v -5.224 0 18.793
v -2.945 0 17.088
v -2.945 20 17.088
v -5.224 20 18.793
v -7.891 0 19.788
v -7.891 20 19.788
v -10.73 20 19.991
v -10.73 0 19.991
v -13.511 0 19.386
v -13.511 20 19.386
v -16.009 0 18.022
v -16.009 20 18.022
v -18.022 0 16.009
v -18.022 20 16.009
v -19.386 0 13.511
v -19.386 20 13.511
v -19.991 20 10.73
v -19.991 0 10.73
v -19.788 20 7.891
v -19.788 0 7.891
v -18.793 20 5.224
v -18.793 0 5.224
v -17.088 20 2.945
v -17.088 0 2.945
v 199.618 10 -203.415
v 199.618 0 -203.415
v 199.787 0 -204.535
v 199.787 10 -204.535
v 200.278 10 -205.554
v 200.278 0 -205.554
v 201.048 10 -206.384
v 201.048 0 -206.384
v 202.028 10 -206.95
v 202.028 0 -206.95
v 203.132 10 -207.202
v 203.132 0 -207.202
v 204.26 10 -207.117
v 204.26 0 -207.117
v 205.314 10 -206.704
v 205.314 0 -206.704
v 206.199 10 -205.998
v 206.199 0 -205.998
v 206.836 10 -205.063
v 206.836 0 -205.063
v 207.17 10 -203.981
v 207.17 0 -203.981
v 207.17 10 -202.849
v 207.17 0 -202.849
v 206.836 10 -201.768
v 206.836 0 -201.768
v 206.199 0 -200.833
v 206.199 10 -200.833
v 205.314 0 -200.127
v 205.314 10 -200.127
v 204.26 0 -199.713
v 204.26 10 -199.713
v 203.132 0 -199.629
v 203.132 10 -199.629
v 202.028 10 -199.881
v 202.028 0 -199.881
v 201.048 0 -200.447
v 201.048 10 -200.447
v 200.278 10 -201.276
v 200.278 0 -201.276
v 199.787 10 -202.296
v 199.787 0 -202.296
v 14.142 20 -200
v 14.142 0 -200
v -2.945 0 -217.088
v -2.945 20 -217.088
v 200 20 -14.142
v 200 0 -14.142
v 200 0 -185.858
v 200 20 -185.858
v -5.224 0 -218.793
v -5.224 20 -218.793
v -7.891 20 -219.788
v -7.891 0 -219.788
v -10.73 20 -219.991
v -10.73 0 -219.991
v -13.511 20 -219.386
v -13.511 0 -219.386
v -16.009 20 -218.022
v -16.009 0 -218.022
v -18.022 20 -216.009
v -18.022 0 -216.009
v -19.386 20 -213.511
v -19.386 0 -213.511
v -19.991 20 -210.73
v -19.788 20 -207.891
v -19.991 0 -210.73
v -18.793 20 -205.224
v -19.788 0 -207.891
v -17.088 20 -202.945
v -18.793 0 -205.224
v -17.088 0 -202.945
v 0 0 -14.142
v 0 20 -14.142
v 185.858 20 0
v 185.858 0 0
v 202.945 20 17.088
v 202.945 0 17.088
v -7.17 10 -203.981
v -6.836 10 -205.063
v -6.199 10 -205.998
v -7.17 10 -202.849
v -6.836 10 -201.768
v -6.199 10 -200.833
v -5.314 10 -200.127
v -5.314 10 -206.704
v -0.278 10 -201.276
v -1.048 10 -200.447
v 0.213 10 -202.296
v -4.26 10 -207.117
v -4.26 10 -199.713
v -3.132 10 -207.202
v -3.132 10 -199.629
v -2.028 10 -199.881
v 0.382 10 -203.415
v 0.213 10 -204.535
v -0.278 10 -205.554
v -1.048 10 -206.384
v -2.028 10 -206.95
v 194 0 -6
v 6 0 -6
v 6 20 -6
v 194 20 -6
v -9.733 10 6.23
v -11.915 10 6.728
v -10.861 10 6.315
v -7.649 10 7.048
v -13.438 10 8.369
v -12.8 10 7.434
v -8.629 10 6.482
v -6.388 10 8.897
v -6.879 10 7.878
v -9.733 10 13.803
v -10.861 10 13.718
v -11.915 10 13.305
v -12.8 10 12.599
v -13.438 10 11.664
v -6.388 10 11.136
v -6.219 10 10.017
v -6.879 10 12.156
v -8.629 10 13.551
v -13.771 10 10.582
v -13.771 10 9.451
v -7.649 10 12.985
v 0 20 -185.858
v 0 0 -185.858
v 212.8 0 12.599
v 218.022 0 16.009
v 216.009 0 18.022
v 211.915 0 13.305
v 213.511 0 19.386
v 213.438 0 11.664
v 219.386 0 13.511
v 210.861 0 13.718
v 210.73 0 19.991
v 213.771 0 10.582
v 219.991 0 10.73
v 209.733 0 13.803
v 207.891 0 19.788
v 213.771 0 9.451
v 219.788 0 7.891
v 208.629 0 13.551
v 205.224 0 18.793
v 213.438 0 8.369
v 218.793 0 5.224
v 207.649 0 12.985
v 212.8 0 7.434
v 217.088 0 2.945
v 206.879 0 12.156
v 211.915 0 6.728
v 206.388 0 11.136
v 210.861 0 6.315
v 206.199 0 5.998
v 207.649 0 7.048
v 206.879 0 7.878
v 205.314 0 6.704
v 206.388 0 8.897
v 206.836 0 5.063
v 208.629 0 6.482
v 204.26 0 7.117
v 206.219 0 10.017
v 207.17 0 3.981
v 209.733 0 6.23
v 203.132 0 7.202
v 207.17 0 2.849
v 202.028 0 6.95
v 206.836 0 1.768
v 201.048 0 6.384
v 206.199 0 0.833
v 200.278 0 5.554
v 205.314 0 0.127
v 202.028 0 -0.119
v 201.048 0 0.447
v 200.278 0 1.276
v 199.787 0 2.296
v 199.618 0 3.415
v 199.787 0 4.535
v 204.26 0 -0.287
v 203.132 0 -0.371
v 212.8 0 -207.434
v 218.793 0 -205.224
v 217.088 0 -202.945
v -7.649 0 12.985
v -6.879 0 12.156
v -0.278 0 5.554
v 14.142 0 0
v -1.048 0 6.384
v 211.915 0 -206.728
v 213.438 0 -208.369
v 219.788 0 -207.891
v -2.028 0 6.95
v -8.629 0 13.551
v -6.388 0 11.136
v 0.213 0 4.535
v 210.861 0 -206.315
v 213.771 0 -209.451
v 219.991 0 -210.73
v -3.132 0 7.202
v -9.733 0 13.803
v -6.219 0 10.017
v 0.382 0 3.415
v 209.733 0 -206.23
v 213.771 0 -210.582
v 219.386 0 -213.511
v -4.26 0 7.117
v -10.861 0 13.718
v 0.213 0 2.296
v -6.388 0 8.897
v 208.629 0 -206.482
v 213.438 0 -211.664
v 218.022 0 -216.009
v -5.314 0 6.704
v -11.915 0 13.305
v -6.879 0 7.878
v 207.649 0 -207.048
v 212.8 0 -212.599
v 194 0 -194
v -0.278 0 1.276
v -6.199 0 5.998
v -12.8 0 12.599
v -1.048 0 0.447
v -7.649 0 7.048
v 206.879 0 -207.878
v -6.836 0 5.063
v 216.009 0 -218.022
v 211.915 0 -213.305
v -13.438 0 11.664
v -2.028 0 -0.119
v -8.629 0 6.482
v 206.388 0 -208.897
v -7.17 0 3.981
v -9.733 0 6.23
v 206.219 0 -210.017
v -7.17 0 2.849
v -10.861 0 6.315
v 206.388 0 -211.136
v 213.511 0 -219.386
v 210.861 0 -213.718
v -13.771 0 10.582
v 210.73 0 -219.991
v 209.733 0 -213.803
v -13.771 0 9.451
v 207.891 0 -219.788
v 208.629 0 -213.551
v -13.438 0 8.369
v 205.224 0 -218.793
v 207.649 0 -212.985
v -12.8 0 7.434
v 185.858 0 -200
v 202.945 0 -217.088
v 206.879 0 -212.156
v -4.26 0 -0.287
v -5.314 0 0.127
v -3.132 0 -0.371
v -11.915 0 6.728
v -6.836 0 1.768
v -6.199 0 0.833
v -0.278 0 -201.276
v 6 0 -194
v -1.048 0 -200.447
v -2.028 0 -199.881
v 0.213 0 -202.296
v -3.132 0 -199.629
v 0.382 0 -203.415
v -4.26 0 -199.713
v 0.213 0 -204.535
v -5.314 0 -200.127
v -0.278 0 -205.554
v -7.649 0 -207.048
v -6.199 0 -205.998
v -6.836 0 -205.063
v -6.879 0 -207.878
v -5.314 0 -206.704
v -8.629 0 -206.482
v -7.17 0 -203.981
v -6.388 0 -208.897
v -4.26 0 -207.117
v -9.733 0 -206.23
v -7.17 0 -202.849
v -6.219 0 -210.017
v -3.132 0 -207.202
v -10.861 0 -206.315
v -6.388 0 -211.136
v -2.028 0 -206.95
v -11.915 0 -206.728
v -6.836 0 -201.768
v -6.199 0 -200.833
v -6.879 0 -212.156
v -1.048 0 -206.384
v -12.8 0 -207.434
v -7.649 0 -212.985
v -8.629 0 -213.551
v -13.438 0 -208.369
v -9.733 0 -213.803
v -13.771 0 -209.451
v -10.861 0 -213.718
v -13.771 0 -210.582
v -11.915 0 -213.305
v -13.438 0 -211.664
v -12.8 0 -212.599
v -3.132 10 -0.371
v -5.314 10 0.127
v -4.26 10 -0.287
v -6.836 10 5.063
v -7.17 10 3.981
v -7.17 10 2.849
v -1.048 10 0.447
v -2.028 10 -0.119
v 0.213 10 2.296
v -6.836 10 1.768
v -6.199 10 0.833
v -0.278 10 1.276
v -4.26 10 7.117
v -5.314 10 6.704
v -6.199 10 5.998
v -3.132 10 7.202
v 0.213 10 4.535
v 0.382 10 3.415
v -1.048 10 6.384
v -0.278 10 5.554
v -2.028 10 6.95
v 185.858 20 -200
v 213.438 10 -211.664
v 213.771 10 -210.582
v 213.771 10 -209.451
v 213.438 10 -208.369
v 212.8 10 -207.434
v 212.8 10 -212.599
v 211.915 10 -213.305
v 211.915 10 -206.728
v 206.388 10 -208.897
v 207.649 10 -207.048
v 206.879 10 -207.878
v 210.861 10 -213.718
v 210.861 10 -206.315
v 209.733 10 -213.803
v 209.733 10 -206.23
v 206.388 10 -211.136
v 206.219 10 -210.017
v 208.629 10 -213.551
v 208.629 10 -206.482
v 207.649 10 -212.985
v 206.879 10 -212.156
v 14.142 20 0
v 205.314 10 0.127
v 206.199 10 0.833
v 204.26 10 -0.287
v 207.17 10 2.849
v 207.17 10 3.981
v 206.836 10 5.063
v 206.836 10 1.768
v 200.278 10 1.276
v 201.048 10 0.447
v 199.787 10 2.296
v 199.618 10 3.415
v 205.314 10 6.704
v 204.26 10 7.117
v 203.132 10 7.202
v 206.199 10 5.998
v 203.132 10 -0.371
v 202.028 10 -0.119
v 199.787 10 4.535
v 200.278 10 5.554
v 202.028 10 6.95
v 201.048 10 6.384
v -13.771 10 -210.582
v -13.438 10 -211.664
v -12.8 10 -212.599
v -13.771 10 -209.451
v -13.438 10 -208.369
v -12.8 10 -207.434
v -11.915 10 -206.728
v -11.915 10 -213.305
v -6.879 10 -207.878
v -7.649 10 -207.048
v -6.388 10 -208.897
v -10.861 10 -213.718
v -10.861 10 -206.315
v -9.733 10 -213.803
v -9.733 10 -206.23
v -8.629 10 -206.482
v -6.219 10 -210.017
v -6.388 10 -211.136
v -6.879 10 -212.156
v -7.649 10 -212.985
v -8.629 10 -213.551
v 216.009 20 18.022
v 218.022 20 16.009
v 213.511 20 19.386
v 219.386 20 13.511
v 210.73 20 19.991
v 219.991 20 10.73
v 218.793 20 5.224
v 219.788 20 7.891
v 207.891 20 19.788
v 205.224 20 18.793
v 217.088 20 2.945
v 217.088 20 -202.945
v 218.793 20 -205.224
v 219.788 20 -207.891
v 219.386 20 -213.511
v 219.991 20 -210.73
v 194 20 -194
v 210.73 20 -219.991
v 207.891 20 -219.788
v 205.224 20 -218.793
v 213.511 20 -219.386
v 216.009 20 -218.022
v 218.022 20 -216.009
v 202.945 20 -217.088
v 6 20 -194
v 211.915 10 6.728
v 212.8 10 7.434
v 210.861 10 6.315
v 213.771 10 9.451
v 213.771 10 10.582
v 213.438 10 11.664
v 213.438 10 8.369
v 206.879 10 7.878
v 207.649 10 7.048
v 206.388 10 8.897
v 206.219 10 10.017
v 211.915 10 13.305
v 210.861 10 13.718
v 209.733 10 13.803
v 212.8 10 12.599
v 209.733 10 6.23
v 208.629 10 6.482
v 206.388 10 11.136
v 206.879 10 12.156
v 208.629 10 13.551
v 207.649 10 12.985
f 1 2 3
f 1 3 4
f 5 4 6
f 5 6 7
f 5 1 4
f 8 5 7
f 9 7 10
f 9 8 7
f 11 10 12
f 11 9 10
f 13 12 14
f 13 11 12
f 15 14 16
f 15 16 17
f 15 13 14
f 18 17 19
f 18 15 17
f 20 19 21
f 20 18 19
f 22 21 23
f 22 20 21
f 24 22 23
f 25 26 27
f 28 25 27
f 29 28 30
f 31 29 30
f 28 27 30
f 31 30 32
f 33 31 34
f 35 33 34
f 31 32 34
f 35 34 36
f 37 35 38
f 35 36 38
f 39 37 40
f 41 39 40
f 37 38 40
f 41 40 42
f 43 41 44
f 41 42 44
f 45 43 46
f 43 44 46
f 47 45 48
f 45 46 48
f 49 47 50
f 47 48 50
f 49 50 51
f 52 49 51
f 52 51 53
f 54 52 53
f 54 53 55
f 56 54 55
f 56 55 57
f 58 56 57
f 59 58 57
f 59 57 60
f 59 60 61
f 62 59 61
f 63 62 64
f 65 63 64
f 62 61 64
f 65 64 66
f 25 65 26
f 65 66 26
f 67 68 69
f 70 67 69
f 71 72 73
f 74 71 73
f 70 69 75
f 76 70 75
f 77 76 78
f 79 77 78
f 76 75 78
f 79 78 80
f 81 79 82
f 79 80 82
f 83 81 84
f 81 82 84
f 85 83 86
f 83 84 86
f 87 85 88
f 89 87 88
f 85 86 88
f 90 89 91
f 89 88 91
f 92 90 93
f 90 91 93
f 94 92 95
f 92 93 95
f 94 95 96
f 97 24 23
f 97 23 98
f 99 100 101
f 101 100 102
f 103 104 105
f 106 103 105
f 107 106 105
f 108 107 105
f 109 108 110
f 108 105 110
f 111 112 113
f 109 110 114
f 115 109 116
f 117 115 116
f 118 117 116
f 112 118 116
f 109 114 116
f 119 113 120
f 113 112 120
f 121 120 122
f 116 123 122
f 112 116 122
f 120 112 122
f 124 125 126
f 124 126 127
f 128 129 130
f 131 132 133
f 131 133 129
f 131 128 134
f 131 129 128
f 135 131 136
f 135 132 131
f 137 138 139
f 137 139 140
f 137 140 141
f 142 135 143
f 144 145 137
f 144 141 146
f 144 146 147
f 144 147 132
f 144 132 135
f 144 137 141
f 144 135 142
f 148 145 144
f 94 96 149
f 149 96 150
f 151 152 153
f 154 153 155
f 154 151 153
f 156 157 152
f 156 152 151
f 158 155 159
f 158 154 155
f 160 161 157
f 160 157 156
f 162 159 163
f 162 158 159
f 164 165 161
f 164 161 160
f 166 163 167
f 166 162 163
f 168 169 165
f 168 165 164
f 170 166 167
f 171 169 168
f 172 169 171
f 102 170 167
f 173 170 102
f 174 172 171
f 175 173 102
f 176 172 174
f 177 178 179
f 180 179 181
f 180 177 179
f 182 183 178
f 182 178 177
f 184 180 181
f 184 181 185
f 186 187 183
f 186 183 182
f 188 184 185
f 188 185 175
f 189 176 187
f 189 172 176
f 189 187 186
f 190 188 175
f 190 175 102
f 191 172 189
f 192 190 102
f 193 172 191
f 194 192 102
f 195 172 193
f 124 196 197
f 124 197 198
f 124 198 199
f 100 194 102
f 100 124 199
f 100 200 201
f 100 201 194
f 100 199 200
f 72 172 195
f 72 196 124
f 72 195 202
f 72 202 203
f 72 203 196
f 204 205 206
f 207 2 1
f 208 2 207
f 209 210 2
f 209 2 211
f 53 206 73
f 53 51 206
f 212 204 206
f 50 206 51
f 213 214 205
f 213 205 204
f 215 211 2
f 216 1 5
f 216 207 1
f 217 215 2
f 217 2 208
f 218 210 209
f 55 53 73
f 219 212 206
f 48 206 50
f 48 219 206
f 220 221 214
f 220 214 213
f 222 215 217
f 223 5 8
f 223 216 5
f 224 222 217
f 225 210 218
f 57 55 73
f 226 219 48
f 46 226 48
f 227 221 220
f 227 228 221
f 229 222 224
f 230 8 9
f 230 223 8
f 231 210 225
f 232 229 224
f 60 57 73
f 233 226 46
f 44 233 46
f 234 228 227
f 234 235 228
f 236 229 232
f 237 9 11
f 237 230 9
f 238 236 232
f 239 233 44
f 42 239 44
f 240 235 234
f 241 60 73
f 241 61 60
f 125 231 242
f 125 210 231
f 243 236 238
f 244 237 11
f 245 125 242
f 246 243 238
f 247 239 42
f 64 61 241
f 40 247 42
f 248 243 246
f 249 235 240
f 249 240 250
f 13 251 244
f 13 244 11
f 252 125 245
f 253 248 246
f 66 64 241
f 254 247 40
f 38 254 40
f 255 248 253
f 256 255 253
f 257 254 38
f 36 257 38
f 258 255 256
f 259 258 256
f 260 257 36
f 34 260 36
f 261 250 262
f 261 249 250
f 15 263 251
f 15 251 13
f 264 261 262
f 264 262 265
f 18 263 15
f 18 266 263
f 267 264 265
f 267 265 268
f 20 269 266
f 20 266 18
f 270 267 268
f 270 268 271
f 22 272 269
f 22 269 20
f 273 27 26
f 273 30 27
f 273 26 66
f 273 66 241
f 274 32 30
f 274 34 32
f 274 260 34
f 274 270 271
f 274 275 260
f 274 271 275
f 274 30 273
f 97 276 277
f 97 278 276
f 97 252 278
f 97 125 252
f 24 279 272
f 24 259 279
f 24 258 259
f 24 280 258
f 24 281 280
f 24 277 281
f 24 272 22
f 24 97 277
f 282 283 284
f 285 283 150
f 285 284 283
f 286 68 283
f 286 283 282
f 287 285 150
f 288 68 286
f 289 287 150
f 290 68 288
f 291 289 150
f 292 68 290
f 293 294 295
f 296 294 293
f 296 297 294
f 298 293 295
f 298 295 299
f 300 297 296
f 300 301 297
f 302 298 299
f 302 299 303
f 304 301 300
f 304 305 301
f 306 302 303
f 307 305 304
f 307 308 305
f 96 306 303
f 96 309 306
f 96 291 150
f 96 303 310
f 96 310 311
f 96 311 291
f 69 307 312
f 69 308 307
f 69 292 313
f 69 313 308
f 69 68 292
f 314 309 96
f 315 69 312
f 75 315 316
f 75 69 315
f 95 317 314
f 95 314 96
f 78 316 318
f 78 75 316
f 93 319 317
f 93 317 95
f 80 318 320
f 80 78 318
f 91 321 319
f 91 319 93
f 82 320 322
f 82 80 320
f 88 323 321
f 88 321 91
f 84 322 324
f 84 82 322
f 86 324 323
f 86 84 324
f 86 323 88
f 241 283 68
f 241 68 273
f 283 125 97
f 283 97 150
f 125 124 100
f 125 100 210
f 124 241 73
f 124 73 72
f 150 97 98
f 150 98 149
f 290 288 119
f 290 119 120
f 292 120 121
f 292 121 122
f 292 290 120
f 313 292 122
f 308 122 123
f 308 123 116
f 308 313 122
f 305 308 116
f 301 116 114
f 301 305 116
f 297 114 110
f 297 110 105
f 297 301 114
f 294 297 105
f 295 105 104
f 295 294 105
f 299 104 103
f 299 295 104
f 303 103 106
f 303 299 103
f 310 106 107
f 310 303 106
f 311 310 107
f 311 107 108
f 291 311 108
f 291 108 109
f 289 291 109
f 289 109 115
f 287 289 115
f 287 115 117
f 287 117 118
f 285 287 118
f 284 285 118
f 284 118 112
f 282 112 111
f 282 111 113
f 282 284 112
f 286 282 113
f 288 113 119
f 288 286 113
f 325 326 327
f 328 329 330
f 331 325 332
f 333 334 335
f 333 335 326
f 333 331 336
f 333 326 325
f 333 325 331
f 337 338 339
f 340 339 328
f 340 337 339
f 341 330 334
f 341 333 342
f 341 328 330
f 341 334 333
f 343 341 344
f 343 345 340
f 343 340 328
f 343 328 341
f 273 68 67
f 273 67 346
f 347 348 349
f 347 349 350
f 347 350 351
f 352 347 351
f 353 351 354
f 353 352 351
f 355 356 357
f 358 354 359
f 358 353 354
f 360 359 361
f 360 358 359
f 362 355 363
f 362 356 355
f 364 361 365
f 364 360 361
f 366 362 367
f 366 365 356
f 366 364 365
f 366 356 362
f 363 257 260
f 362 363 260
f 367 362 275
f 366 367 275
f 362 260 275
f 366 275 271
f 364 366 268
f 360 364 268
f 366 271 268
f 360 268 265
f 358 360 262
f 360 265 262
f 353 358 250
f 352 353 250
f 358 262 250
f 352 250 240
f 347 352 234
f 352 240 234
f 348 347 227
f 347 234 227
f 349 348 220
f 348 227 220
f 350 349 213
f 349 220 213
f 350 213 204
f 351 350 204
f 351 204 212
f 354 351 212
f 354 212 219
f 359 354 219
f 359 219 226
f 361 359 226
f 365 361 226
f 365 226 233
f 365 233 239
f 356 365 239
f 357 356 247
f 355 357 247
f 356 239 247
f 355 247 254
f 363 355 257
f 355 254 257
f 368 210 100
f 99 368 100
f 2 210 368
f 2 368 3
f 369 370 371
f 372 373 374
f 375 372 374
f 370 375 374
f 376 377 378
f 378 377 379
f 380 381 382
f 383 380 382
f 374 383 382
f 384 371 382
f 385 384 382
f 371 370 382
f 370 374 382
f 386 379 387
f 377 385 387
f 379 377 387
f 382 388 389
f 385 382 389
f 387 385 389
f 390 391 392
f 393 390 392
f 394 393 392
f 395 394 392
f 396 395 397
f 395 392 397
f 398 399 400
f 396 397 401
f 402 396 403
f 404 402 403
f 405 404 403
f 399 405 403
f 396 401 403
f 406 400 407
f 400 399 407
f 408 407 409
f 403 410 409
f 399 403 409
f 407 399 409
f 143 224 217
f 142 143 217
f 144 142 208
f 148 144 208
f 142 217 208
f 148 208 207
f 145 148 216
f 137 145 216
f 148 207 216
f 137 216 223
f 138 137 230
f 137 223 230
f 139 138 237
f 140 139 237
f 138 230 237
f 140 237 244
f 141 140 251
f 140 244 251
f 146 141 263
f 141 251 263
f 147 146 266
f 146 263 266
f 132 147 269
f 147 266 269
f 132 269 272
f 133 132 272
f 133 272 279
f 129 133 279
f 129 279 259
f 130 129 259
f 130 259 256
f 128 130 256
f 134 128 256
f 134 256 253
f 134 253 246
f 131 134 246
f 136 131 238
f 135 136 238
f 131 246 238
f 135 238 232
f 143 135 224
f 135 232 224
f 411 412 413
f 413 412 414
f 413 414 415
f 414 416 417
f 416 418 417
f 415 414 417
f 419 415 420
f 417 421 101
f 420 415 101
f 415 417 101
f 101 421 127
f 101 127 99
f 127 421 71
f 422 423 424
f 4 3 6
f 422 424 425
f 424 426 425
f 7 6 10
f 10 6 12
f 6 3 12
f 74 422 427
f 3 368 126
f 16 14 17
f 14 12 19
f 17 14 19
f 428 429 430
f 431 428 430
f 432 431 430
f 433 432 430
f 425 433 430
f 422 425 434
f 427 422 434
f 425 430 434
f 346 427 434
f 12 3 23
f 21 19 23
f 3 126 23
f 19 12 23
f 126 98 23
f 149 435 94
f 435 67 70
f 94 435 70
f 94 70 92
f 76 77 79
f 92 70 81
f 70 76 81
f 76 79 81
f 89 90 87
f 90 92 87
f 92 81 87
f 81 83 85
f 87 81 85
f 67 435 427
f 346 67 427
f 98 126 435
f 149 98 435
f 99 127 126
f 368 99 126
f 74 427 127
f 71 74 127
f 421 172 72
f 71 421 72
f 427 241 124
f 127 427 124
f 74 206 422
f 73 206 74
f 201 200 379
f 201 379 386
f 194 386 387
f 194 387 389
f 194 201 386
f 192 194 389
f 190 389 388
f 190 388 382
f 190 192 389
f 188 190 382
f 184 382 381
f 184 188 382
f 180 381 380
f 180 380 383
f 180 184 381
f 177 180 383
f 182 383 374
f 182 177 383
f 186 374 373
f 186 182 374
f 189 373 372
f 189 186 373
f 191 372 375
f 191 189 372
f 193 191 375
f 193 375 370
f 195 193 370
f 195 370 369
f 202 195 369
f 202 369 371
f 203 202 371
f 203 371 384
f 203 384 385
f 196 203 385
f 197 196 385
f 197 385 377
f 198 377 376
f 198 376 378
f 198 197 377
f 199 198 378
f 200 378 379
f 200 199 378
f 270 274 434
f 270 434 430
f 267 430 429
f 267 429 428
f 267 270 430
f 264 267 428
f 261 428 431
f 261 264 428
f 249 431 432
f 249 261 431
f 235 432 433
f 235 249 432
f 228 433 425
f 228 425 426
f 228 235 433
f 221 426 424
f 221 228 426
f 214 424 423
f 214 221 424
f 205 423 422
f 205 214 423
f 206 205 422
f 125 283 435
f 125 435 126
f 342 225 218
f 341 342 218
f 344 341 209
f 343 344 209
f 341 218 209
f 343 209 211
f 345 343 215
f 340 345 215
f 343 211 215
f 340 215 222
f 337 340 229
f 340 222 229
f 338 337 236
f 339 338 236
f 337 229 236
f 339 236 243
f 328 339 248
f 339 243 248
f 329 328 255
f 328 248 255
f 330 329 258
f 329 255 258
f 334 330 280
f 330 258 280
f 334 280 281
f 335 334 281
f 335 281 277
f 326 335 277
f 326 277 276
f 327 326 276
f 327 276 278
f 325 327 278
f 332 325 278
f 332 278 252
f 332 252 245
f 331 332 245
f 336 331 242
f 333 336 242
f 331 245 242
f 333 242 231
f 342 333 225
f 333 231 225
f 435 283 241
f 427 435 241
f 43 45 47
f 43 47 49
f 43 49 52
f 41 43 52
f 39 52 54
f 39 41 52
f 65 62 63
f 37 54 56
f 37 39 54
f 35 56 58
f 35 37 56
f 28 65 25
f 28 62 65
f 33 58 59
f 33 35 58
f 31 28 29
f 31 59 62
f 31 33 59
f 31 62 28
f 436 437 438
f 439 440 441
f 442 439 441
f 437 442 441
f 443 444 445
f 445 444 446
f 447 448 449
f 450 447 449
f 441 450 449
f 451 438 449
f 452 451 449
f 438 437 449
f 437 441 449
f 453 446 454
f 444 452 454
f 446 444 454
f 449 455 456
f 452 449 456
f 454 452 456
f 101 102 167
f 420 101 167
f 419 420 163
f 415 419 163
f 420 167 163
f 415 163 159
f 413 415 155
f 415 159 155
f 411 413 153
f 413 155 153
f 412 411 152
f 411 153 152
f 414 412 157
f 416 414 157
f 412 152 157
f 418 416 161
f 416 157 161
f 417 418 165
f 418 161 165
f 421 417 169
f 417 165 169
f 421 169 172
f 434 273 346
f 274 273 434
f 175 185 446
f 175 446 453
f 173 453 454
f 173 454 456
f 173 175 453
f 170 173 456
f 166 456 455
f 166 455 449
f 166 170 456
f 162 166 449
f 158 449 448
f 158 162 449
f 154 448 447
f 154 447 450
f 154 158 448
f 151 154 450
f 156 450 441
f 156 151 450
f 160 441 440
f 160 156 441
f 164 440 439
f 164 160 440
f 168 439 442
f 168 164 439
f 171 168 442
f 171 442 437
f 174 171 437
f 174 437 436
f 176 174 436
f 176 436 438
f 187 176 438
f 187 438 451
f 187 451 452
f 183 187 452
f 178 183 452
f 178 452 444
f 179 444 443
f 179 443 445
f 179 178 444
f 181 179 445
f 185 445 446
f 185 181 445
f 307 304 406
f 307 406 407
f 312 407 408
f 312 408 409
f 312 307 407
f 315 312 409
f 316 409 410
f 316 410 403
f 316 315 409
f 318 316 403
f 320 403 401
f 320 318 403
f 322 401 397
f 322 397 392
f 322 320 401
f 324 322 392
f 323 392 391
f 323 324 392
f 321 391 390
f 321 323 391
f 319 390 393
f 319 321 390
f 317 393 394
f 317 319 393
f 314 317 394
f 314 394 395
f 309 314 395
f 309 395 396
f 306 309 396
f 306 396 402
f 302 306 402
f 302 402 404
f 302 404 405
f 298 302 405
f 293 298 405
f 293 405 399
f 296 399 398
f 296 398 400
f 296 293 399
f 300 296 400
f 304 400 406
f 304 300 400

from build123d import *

# Parameters (mm, degrees)
SKETCH1_W               = 200
SKETCH1_H               = 200
BOSS_EXTRUDE1_DEPTH     = 20
BOSS_EXTRUDE2_DEPTH     = 20
SKETCH2_4_R             = 3.7970867
CUT_EXTRUDE2_DEPTH      = 10
MIRROR4_COPY_1_DEPTH    = 20
MIRROR4_COPY_2_SKETCH_R = 3.7970867
MIRROR4_COPY_2_DEPTH    = 10
SKETCH3_W               = 188
SKETCH3_H               = 188
CUT_EXTRUDE1_DEPTH      = 21


with BuildPart() as part:
    # Sketch1 → Boss-Extrude1 (new body)
    with BuildSketch(Plane(origin=(0, 0, 0), x_dir=(1, 0, 0), z_dir=(0, 1, 0))):
        with Locations((100, 100)):
            Rectangle(SKETCH1_W, SKETCH1_H)
    extrude(amount=BOSS_EXTRUDE1_DEPTH)

    # Sketch2 → Boss-Extrude2 (add)
    with BuildSketch(Plane.XZ):
        with BuildLine():
            Line((-17.087625271, 2.945489647), (0, -14.142135624))
            Line((0, -14.142135624), (0, 0))
            Line((0, 0), (14.142135624, 0))
            Line((14.142135624, 0), (-2.945489647, 17.087625271))
            ThreePointArc((-2.945489647, 17.087625271), (-17.087625271, 17.087625271), (-17.087625271, 2.945489647))
        make_face()
    boss_extrude2 = extrude(amount=-BOSS_EXTRUDE2_DEPTH)

    # Sketch2<4> → Cut-Extrude2 (cut)
    with BuildSketch(Plane.XZ):
        with Locations((-10.016557459, 10.016557459)):
            Circle(SKETCH2_4_R)
        with Locations((-3.415367361, 3.415367361)):
            Circle(SKETCH2_4_R)
    cut_extrude2 = extrude(amount=-CUT_EXTRUDE2_DEPTH, mode=Mode.SUBTRACT)

    # Mirror3: Boss-Extrude2, Cut-Extrude2 across plane
    add(boss_extrude2.mirror(Plane(origin=(100, 0, 0), x_dir=(0, 0, 1), z_dir=(1, 0, 0))))
    add(cut_extrude2.mirror(Plane(origin=(100, 0, 0), x_dir=(0, 0, 1), z_dir=(1, 0, 0))), mode=Mode.SUBTRACT)

    # Mirror4: Boss-Extrude2, Cut-Extrude2 across plane
    add(boss_extrude2.mirror(Plane(origin=(0, 0, -100), x_dir=(1, 0, 0), z_dir=(0, 0, -1))))
    add(cut_extrude2.mirror(Plane(origin=(0, 0, -100), x_dir=(1, 0, 0), z_dir=(0, 0, -1))), mode=Mode.SUBTRACT)

    # Mirror4 copy 1 sketch → Mirror4 copy 1 (add)
    with BuildSketch(Plane(origin=(200, 0, -200), x_dir=(-1, 0, 0), z_dir=(0, -1, 0))):
        with BuildLine():
            Line((-17.087625271, 2.945489647), (0, -14.142135624))
            Line((0, -14.142135624), (0, 0))
            Line((0, 0), (14.142135624, 0))
            Line((14.142135624, 0), (-2.945489647, 17.087625271))
            ThreePointArc((-2.945489647, 17.087625271), (-17.087625271, 17.087625271), (-17.087625271, 2.945489647))
        make_face()
    extrude(amount=-MIRROR4_COPY_1_DEPTH)

    # Mirror4 copy 2 sketch → Mirror4 copy 2 (cut)
    with BuildSketch(Plane(origin=(200, 0, -200), x_dir=(-1, 0, 0), z_dir=(0, -1, 0))):
        with Locations((-10.016557459, 10.016557459)):
            Circle(MIRROR4_COPY_2_SKETCH_R)
        with Locations((-3.415367361, 3.415367361)):
            Circle(MIRROR4_COPY_2_SKETCH_R)
    extrude(amount=-MIRROR4_COPY_2_DEPTH, mode=Mode.SUBTRACT)

    # Sketch3 → Cut-Extrude1 (cut, through all)
    with BuildSketch(Plane.XZ):
        with Locations((100, -100)):
            Rectangle(SKETCH3_W, SKETCH3_H)
    extrude(amount=-CUT_EXTRUDE1_DEPTH, mode=Mode.SUBTRACT)


solid = part.part
